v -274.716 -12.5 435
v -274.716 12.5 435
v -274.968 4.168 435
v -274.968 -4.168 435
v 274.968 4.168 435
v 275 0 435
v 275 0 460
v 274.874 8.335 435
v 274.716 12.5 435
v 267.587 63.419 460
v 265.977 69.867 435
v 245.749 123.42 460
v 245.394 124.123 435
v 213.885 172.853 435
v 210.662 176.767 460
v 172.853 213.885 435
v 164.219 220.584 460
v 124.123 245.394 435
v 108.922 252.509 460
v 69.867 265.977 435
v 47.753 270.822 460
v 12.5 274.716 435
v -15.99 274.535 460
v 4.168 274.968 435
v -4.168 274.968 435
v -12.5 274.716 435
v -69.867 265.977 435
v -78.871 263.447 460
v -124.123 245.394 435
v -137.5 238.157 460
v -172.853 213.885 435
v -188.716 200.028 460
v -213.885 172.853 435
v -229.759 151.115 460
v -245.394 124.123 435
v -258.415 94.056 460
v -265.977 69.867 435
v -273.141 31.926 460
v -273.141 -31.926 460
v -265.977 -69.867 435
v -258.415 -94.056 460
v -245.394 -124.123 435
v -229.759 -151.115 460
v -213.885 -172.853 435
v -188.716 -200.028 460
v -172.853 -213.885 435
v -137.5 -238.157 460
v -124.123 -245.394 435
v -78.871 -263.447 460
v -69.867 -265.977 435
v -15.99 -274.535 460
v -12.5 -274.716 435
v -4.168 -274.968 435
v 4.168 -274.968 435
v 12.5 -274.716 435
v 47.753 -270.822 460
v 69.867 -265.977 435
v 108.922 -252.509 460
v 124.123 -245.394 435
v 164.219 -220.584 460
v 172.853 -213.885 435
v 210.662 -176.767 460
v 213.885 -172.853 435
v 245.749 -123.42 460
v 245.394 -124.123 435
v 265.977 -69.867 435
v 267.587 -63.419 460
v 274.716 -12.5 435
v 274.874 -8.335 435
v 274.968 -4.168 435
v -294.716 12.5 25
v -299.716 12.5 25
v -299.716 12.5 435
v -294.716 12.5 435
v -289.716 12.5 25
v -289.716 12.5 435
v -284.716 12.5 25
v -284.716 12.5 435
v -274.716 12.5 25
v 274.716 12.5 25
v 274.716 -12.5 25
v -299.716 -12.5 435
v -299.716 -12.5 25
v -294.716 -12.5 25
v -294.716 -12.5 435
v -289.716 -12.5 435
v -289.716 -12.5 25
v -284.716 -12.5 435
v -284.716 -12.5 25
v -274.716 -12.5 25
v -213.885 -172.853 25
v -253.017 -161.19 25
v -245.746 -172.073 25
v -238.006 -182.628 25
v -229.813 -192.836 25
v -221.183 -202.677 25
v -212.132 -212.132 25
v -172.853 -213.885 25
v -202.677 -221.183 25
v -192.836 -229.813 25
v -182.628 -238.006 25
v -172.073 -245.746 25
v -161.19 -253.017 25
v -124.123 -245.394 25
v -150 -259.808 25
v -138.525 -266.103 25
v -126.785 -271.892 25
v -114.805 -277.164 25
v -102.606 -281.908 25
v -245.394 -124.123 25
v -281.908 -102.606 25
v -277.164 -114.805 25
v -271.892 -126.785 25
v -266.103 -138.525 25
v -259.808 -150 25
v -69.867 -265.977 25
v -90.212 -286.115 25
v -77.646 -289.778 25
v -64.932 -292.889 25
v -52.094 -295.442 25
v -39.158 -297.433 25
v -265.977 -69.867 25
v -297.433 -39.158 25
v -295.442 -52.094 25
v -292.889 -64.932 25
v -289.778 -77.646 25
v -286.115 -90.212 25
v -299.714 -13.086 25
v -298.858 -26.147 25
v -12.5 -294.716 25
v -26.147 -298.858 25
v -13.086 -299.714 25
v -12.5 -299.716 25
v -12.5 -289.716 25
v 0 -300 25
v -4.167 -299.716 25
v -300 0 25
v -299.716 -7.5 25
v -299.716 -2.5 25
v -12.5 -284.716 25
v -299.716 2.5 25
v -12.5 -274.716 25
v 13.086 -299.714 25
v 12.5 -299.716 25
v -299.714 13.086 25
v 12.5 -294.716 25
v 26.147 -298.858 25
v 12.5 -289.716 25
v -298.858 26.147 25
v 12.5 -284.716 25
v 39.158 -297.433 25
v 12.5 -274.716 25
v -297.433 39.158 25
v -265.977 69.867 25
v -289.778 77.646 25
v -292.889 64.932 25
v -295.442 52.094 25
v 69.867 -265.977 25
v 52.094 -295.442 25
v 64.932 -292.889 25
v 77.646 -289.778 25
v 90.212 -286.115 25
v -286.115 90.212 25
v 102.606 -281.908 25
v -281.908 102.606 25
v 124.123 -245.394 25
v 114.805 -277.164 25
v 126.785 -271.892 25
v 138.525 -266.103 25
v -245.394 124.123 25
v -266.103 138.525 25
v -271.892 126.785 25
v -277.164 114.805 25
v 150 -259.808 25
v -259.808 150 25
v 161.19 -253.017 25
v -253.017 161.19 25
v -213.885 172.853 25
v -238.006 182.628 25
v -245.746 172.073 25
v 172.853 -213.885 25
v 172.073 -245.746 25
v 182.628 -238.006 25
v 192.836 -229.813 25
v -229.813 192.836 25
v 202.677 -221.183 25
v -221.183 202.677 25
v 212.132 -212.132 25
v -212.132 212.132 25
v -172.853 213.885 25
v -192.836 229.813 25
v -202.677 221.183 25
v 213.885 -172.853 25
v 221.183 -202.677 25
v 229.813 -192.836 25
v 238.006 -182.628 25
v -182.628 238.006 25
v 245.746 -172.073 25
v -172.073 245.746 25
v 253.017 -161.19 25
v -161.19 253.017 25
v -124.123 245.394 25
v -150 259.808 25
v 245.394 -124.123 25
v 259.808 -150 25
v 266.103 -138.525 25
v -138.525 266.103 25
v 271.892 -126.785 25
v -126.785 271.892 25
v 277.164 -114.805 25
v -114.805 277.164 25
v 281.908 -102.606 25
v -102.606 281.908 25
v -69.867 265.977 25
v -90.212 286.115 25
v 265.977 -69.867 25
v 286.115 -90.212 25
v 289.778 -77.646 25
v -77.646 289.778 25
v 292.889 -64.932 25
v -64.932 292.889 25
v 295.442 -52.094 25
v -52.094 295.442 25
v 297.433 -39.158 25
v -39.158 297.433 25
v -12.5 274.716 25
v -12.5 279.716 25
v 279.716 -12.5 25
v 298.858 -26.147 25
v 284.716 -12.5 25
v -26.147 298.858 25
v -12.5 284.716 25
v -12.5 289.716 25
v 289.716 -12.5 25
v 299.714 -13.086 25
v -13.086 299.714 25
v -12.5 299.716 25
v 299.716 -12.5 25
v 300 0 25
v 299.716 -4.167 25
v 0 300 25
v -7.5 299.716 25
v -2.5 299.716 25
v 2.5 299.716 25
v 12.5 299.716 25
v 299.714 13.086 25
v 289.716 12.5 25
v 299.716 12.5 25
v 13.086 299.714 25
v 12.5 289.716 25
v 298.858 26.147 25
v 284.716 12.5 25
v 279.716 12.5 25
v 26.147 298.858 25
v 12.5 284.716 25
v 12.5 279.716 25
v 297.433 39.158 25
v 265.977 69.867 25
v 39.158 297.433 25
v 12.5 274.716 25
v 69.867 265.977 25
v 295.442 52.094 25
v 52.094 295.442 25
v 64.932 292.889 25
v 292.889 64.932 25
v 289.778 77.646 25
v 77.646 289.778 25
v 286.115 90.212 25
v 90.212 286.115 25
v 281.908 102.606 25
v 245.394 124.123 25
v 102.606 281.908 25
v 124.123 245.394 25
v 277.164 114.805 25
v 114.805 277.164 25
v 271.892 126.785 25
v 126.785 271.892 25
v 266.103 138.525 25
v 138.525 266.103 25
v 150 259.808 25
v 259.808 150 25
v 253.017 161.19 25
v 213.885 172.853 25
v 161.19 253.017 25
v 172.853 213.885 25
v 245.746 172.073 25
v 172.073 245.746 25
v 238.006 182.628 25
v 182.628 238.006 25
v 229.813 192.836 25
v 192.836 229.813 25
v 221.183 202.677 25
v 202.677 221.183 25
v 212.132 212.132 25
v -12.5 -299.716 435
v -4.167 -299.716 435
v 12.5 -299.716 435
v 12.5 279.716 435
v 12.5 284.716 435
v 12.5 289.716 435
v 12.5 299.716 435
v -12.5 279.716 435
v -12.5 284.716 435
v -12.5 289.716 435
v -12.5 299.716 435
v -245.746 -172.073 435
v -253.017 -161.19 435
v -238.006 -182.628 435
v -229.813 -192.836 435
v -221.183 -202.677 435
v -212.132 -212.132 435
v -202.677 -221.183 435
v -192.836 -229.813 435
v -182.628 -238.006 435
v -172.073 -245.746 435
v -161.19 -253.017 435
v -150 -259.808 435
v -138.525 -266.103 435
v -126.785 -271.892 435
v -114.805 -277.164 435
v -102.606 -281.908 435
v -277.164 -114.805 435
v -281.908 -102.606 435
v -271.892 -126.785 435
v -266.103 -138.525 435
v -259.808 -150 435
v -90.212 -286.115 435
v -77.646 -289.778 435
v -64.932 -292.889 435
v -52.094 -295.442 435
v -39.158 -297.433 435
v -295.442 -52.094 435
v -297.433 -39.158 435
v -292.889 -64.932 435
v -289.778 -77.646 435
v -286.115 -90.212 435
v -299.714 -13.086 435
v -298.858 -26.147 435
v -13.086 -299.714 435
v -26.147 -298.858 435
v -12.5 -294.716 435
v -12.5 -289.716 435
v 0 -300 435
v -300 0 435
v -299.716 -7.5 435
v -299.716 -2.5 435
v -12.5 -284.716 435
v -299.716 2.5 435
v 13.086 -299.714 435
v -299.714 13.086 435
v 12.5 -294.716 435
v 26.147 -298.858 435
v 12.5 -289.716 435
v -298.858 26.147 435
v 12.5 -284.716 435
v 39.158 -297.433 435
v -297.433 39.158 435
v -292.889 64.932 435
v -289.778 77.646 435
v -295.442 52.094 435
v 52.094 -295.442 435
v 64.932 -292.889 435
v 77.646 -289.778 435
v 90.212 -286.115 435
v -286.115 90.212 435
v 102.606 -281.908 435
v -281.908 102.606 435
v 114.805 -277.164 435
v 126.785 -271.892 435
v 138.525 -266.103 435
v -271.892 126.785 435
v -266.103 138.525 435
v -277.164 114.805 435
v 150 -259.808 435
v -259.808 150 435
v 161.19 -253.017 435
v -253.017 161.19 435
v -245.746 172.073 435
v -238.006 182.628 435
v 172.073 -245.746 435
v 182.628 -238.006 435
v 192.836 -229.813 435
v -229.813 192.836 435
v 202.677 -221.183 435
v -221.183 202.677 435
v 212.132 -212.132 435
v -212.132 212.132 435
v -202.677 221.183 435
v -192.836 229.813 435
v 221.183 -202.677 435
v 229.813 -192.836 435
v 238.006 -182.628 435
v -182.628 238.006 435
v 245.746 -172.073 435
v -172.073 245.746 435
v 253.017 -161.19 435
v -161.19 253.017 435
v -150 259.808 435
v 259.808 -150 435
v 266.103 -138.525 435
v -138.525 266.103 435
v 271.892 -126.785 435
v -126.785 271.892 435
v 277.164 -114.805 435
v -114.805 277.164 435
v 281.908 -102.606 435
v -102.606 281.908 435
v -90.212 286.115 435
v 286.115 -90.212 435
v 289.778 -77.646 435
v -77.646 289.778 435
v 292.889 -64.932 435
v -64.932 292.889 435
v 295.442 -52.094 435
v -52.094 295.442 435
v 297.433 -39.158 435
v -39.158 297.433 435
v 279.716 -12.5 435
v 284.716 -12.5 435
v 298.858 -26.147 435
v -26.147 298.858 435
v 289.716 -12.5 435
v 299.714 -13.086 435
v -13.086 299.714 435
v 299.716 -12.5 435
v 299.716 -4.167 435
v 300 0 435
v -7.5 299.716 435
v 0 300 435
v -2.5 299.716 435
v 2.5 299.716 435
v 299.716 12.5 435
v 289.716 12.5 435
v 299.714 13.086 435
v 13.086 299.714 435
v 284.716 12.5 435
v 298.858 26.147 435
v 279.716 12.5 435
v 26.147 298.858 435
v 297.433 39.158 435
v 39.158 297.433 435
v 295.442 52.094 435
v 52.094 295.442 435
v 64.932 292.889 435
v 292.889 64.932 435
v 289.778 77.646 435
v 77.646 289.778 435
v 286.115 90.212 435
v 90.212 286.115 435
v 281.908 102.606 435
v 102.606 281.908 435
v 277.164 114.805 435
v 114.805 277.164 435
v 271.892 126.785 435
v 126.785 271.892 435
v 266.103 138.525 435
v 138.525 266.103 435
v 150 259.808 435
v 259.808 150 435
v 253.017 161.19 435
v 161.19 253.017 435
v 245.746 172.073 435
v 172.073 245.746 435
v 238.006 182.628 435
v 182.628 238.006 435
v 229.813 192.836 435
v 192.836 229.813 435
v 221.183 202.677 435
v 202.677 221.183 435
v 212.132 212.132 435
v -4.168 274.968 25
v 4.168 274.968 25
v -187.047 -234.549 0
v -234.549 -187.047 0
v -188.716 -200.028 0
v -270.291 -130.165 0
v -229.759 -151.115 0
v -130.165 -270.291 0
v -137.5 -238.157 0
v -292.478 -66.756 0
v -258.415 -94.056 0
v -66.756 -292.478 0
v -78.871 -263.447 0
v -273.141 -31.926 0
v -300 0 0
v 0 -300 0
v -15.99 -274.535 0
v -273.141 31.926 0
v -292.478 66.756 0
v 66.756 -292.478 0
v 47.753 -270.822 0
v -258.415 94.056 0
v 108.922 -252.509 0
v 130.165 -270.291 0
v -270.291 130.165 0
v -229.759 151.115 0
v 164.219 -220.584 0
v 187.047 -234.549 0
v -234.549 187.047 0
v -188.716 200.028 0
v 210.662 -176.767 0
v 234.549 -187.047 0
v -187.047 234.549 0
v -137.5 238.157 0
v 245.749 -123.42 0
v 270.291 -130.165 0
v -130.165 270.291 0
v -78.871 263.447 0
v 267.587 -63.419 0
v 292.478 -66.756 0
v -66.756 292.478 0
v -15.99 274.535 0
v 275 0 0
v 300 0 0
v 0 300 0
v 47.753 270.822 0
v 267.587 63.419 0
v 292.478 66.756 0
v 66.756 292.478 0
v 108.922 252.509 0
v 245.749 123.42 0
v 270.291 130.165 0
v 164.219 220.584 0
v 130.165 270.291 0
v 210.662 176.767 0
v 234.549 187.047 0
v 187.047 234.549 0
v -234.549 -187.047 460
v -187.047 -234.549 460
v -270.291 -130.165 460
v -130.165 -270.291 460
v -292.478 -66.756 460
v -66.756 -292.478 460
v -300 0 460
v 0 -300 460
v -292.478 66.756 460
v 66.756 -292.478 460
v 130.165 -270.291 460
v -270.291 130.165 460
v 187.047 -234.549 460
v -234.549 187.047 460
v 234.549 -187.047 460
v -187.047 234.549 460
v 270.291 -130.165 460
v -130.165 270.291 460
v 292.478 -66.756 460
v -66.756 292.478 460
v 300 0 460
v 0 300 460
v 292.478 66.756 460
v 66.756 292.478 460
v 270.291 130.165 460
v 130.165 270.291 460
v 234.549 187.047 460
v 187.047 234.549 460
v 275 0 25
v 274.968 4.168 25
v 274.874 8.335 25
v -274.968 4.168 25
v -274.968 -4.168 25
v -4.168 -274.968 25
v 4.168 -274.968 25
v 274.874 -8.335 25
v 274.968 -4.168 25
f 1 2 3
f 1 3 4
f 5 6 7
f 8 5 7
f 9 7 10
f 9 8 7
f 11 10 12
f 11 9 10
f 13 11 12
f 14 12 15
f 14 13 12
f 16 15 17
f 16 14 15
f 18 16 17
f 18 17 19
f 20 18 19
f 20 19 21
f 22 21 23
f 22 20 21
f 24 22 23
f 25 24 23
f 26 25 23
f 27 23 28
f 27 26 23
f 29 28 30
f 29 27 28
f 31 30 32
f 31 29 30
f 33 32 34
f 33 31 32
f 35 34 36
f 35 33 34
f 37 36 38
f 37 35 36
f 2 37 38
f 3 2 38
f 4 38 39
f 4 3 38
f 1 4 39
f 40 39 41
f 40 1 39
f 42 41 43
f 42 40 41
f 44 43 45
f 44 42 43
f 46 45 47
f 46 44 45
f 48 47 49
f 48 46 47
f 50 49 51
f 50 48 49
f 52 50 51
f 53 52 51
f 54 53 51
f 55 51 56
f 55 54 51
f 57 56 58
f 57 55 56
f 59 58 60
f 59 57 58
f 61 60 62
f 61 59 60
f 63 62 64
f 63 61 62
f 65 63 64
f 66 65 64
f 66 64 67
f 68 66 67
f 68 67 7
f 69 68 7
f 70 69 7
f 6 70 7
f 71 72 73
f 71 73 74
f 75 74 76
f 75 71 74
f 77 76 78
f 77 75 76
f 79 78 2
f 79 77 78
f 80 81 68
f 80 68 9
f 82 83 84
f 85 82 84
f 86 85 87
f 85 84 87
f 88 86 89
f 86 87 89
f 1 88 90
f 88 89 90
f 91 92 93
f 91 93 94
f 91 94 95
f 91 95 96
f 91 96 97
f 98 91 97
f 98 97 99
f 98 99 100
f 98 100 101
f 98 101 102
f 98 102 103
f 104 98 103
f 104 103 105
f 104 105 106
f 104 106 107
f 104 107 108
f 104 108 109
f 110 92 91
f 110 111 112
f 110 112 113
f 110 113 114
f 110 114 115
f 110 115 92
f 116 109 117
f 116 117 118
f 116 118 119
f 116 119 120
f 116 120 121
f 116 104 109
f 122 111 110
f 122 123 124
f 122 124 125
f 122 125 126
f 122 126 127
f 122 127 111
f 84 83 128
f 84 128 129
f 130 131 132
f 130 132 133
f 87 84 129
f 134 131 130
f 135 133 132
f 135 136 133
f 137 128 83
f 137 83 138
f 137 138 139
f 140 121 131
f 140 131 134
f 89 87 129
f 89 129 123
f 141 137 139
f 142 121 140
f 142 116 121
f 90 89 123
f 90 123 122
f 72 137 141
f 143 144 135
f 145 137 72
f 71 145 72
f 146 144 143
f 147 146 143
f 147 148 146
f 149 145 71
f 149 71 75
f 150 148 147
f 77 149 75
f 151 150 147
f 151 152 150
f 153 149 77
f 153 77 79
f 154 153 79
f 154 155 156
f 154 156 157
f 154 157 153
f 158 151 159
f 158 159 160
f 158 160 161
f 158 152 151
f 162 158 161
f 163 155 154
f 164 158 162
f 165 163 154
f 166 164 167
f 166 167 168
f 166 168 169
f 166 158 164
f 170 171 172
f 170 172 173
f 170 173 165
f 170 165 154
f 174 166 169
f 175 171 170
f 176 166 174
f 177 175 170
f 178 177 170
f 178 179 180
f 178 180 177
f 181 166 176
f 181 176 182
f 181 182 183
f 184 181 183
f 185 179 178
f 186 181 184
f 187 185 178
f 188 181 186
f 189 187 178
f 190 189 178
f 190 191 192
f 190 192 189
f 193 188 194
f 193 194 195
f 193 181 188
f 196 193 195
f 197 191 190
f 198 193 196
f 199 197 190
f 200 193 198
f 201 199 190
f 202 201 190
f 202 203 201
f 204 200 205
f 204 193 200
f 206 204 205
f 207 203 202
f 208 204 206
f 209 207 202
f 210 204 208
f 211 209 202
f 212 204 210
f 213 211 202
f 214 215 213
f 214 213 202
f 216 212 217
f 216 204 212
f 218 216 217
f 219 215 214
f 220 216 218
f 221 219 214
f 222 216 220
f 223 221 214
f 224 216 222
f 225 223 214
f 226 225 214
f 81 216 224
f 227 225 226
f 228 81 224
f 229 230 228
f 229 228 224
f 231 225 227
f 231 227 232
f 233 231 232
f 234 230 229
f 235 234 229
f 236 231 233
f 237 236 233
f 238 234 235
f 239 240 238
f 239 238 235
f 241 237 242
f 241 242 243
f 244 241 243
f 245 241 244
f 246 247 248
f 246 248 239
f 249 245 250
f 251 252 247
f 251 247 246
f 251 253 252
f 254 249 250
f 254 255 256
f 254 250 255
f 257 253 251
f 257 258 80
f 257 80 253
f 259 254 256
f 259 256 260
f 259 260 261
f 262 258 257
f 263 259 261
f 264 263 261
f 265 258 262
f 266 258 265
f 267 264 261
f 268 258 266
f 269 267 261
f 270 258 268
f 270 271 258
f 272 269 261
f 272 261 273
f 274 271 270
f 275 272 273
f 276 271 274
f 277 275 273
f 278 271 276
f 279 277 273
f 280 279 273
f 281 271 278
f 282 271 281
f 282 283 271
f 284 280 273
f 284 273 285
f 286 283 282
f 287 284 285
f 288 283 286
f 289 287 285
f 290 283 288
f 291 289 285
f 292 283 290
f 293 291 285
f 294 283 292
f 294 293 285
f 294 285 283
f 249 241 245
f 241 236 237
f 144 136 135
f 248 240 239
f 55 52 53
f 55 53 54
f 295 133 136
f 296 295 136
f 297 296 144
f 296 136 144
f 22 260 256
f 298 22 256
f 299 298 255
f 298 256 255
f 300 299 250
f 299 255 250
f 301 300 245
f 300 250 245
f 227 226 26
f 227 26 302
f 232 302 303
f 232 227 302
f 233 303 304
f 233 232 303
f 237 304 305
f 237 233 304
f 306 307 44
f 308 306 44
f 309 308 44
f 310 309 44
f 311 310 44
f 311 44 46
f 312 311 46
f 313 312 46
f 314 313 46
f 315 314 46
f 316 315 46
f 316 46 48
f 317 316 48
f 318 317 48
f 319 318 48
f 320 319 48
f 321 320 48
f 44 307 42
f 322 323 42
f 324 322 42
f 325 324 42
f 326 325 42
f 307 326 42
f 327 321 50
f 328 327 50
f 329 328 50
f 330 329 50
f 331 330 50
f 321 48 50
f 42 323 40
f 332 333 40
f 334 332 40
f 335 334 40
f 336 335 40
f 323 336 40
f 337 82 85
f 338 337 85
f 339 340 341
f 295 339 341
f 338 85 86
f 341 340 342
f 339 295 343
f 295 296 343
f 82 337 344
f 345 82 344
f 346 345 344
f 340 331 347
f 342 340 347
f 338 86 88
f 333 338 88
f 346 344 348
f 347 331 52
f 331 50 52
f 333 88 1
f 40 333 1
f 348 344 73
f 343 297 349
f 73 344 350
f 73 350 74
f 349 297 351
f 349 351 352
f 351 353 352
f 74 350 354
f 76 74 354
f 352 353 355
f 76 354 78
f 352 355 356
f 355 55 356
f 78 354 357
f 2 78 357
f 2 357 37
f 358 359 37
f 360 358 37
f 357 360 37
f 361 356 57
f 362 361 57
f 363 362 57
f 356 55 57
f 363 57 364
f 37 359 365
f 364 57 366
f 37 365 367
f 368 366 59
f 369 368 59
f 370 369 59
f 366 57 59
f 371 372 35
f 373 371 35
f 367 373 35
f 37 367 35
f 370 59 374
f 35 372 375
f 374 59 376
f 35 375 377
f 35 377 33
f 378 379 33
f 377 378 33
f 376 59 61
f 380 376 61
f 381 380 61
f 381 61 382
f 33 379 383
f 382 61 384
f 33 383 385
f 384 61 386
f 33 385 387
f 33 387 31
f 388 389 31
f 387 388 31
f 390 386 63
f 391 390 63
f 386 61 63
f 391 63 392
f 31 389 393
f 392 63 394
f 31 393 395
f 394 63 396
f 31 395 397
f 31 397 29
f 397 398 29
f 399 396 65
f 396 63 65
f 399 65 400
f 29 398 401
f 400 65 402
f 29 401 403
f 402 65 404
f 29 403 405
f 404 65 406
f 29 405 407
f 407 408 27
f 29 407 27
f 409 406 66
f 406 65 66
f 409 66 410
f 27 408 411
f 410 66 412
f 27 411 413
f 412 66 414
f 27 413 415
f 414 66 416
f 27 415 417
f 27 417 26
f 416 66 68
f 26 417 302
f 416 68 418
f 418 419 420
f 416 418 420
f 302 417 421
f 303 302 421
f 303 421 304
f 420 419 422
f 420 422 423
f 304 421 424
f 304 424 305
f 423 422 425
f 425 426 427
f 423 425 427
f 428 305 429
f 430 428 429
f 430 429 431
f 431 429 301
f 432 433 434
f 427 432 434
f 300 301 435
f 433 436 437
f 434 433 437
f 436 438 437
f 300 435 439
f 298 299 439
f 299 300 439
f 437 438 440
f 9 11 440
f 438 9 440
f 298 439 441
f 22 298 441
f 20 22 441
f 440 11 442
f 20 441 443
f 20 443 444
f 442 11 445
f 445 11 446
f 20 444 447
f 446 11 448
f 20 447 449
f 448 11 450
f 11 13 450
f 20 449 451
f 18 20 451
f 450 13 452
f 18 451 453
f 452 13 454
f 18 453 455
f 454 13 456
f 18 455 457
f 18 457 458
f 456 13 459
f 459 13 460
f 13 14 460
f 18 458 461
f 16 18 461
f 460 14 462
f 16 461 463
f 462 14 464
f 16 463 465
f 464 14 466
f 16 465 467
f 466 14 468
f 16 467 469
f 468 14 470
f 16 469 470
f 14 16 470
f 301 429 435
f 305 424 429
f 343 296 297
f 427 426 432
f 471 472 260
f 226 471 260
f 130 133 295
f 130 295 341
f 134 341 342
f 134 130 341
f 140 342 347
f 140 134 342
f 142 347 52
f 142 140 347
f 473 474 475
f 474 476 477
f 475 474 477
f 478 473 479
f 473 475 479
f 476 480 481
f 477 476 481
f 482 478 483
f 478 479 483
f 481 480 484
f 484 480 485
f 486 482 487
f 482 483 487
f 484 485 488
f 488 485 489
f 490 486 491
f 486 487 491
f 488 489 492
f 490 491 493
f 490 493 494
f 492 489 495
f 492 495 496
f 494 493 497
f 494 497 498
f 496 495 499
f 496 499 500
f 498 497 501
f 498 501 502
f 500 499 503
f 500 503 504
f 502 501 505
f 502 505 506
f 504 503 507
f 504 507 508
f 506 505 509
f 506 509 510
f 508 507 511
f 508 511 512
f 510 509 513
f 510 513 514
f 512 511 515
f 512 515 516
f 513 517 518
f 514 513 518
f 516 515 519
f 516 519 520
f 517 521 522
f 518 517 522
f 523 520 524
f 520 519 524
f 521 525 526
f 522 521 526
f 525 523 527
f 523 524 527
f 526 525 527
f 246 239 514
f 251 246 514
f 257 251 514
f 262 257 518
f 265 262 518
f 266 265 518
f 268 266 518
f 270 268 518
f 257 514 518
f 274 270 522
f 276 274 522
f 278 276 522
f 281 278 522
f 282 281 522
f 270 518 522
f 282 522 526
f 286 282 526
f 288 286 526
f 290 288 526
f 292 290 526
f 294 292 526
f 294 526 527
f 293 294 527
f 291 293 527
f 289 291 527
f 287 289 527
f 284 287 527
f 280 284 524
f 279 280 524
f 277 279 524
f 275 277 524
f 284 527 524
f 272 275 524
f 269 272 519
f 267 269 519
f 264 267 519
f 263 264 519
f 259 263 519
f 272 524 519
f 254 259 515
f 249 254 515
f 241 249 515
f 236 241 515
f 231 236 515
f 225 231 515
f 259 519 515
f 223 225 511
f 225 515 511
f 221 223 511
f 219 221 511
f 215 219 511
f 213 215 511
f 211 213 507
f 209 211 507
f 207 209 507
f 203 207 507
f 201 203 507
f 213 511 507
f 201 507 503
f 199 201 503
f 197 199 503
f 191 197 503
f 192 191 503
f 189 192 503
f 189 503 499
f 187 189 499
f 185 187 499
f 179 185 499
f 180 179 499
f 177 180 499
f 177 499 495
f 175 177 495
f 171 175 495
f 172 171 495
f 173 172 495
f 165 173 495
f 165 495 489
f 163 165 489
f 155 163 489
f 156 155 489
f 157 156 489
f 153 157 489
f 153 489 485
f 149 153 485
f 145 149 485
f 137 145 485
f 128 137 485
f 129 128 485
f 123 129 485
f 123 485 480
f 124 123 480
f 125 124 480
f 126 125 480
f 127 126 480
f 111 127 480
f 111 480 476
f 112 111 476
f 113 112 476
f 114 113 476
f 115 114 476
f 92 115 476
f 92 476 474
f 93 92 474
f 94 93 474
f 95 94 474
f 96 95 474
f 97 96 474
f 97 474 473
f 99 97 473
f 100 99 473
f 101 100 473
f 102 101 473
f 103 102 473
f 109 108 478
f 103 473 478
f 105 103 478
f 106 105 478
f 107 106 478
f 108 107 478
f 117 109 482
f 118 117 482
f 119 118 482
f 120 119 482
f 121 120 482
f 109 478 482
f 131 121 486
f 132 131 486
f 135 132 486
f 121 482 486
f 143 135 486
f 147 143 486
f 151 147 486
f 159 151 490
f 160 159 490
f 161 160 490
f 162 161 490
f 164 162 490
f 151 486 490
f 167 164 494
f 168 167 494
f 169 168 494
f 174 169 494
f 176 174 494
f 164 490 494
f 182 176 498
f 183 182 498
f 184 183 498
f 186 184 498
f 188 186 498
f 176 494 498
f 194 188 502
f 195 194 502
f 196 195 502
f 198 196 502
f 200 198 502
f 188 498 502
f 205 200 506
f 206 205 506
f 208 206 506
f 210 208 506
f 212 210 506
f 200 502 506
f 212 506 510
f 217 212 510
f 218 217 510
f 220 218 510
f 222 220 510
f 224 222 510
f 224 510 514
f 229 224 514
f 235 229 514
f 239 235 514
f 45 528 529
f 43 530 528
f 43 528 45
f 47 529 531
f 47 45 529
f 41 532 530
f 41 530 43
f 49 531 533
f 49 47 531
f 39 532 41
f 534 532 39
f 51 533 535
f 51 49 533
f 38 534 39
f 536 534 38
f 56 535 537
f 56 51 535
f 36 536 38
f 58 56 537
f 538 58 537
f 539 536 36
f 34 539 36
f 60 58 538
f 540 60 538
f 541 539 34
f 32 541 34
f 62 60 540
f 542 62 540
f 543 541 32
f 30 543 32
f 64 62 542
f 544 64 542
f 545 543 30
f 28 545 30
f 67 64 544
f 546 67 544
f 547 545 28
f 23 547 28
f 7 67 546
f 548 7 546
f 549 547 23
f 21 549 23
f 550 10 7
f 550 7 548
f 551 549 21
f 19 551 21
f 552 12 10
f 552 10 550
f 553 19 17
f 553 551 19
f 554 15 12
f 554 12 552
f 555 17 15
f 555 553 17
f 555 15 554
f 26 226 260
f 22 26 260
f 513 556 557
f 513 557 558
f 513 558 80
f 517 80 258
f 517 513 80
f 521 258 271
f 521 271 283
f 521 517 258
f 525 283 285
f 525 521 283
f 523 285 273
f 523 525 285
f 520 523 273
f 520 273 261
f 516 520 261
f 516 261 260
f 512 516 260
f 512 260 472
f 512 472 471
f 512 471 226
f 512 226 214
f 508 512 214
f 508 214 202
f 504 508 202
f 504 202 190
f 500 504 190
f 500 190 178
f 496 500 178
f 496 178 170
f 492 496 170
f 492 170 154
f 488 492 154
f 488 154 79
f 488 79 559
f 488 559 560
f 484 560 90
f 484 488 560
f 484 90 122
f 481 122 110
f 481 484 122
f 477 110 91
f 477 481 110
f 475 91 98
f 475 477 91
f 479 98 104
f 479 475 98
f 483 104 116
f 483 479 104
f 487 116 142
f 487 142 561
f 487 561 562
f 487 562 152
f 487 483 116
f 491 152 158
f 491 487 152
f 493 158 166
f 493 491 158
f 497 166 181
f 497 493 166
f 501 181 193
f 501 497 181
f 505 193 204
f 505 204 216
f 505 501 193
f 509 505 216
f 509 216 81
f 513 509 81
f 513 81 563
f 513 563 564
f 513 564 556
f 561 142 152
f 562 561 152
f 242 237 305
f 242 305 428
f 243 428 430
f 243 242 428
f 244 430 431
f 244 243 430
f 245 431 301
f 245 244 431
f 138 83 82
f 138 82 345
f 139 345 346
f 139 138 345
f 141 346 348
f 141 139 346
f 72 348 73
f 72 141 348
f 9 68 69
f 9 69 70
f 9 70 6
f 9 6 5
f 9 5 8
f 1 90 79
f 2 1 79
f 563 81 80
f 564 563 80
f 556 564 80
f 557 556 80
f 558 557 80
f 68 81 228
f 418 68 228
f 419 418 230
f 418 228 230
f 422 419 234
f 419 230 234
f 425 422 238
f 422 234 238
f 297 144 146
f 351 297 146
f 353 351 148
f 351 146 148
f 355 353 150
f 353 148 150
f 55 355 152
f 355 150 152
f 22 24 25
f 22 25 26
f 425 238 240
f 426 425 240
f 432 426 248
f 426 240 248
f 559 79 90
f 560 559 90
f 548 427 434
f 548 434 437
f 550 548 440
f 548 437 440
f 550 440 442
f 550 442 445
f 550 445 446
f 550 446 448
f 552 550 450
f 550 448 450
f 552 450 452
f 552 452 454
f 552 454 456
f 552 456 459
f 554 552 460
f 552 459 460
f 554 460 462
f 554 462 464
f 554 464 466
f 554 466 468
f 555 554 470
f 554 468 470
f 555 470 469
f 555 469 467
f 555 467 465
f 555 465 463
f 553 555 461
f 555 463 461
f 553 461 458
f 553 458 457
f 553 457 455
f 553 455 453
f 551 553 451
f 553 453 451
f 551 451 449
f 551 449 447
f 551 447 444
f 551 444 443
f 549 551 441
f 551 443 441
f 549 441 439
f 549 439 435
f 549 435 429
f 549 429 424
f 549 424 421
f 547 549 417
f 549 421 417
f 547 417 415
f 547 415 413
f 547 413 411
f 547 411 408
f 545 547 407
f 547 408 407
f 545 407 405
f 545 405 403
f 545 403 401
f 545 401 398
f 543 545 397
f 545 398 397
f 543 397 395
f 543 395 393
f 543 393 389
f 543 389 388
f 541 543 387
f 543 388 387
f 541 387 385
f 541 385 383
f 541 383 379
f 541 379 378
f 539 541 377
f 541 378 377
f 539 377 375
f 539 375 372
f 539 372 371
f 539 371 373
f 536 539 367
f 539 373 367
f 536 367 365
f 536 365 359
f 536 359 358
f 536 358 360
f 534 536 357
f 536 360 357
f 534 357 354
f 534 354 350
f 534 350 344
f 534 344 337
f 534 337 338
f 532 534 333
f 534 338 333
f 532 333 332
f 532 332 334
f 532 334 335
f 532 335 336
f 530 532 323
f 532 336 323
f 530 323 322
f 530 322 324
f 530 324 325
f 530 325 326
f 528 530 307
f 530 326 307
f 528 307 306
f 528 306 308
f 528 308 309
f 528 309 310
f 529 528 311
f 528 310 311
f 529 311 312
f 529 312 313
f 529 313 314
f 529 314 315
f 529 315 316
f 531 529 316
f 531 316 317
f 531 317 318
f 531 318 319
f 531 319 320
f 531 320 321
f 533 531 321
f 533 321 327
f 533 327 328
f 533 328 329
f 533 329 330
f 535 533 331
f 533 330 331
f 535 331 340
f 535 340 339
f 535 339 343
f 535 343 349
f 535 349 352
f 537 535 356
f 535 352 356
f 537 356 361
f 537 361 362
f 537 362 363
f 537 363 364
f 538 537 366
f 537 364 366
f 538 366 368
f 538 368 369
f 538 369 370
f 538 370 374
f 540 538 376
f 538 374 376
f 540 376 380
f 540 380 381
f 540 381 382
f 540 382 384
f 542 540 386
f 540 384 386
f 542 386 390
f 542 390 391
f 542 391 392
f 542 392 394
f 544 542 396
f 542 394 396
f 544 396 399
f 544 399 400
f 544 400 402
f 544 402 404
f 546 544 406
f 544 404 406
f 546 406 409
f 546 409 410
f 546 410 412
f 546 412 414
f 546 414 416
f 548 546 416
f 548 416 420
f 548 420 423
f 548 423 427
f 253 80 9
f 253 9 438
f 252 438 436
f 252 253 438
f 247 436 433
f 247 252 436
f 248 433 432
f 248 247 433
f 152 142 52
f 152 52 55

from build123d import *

# Parameters (mm, degrees)
F1_R     = 300
F1_R_2   = 275
F2_DEPTH = 25
F3_W     = 25
F3_H     = 25
F4_DEPTH = 410
F6_R     = 300
F6_R_2   = 275
F7_DEPTH = 25


with BuildPart() as f2:
    # F1 (on face) → F2 (new body)
    with BuildSketch(Plane.XY):
        Circle(F1_R)
        Circle(F1_R_2, mode=Mode.SUBTRACT)
    extrude(amount=F2_DEPTH)

    # F3 (on face) → F4 (join)
    with BuildSketch(Plane.XY.offset(25)):
        with Locations((0, 287.215762)):
            Rectangle(F3_W, F3_H)
        with Locations((-287.215762, 0)):
            Rectangle(F3_W, F3_H)
        with Locations((0, -287.215762)):
            Rectangle(F3_W, F3_H)
        with Locations((287.215762, 0)):
            Rectangle(F3_W, F3_H)
    extrude(amount=F4_DEPTH)

    # F6 (on offset) → F7 (join)
    with BuildSketch(Plane.XY.offset(435)):
        Circle(F6_R)
        Circle(F6_R_2, mode=Mode.SUBTRACT)
    extrude(amount=F7_DEPTH)


solid = f2.part
